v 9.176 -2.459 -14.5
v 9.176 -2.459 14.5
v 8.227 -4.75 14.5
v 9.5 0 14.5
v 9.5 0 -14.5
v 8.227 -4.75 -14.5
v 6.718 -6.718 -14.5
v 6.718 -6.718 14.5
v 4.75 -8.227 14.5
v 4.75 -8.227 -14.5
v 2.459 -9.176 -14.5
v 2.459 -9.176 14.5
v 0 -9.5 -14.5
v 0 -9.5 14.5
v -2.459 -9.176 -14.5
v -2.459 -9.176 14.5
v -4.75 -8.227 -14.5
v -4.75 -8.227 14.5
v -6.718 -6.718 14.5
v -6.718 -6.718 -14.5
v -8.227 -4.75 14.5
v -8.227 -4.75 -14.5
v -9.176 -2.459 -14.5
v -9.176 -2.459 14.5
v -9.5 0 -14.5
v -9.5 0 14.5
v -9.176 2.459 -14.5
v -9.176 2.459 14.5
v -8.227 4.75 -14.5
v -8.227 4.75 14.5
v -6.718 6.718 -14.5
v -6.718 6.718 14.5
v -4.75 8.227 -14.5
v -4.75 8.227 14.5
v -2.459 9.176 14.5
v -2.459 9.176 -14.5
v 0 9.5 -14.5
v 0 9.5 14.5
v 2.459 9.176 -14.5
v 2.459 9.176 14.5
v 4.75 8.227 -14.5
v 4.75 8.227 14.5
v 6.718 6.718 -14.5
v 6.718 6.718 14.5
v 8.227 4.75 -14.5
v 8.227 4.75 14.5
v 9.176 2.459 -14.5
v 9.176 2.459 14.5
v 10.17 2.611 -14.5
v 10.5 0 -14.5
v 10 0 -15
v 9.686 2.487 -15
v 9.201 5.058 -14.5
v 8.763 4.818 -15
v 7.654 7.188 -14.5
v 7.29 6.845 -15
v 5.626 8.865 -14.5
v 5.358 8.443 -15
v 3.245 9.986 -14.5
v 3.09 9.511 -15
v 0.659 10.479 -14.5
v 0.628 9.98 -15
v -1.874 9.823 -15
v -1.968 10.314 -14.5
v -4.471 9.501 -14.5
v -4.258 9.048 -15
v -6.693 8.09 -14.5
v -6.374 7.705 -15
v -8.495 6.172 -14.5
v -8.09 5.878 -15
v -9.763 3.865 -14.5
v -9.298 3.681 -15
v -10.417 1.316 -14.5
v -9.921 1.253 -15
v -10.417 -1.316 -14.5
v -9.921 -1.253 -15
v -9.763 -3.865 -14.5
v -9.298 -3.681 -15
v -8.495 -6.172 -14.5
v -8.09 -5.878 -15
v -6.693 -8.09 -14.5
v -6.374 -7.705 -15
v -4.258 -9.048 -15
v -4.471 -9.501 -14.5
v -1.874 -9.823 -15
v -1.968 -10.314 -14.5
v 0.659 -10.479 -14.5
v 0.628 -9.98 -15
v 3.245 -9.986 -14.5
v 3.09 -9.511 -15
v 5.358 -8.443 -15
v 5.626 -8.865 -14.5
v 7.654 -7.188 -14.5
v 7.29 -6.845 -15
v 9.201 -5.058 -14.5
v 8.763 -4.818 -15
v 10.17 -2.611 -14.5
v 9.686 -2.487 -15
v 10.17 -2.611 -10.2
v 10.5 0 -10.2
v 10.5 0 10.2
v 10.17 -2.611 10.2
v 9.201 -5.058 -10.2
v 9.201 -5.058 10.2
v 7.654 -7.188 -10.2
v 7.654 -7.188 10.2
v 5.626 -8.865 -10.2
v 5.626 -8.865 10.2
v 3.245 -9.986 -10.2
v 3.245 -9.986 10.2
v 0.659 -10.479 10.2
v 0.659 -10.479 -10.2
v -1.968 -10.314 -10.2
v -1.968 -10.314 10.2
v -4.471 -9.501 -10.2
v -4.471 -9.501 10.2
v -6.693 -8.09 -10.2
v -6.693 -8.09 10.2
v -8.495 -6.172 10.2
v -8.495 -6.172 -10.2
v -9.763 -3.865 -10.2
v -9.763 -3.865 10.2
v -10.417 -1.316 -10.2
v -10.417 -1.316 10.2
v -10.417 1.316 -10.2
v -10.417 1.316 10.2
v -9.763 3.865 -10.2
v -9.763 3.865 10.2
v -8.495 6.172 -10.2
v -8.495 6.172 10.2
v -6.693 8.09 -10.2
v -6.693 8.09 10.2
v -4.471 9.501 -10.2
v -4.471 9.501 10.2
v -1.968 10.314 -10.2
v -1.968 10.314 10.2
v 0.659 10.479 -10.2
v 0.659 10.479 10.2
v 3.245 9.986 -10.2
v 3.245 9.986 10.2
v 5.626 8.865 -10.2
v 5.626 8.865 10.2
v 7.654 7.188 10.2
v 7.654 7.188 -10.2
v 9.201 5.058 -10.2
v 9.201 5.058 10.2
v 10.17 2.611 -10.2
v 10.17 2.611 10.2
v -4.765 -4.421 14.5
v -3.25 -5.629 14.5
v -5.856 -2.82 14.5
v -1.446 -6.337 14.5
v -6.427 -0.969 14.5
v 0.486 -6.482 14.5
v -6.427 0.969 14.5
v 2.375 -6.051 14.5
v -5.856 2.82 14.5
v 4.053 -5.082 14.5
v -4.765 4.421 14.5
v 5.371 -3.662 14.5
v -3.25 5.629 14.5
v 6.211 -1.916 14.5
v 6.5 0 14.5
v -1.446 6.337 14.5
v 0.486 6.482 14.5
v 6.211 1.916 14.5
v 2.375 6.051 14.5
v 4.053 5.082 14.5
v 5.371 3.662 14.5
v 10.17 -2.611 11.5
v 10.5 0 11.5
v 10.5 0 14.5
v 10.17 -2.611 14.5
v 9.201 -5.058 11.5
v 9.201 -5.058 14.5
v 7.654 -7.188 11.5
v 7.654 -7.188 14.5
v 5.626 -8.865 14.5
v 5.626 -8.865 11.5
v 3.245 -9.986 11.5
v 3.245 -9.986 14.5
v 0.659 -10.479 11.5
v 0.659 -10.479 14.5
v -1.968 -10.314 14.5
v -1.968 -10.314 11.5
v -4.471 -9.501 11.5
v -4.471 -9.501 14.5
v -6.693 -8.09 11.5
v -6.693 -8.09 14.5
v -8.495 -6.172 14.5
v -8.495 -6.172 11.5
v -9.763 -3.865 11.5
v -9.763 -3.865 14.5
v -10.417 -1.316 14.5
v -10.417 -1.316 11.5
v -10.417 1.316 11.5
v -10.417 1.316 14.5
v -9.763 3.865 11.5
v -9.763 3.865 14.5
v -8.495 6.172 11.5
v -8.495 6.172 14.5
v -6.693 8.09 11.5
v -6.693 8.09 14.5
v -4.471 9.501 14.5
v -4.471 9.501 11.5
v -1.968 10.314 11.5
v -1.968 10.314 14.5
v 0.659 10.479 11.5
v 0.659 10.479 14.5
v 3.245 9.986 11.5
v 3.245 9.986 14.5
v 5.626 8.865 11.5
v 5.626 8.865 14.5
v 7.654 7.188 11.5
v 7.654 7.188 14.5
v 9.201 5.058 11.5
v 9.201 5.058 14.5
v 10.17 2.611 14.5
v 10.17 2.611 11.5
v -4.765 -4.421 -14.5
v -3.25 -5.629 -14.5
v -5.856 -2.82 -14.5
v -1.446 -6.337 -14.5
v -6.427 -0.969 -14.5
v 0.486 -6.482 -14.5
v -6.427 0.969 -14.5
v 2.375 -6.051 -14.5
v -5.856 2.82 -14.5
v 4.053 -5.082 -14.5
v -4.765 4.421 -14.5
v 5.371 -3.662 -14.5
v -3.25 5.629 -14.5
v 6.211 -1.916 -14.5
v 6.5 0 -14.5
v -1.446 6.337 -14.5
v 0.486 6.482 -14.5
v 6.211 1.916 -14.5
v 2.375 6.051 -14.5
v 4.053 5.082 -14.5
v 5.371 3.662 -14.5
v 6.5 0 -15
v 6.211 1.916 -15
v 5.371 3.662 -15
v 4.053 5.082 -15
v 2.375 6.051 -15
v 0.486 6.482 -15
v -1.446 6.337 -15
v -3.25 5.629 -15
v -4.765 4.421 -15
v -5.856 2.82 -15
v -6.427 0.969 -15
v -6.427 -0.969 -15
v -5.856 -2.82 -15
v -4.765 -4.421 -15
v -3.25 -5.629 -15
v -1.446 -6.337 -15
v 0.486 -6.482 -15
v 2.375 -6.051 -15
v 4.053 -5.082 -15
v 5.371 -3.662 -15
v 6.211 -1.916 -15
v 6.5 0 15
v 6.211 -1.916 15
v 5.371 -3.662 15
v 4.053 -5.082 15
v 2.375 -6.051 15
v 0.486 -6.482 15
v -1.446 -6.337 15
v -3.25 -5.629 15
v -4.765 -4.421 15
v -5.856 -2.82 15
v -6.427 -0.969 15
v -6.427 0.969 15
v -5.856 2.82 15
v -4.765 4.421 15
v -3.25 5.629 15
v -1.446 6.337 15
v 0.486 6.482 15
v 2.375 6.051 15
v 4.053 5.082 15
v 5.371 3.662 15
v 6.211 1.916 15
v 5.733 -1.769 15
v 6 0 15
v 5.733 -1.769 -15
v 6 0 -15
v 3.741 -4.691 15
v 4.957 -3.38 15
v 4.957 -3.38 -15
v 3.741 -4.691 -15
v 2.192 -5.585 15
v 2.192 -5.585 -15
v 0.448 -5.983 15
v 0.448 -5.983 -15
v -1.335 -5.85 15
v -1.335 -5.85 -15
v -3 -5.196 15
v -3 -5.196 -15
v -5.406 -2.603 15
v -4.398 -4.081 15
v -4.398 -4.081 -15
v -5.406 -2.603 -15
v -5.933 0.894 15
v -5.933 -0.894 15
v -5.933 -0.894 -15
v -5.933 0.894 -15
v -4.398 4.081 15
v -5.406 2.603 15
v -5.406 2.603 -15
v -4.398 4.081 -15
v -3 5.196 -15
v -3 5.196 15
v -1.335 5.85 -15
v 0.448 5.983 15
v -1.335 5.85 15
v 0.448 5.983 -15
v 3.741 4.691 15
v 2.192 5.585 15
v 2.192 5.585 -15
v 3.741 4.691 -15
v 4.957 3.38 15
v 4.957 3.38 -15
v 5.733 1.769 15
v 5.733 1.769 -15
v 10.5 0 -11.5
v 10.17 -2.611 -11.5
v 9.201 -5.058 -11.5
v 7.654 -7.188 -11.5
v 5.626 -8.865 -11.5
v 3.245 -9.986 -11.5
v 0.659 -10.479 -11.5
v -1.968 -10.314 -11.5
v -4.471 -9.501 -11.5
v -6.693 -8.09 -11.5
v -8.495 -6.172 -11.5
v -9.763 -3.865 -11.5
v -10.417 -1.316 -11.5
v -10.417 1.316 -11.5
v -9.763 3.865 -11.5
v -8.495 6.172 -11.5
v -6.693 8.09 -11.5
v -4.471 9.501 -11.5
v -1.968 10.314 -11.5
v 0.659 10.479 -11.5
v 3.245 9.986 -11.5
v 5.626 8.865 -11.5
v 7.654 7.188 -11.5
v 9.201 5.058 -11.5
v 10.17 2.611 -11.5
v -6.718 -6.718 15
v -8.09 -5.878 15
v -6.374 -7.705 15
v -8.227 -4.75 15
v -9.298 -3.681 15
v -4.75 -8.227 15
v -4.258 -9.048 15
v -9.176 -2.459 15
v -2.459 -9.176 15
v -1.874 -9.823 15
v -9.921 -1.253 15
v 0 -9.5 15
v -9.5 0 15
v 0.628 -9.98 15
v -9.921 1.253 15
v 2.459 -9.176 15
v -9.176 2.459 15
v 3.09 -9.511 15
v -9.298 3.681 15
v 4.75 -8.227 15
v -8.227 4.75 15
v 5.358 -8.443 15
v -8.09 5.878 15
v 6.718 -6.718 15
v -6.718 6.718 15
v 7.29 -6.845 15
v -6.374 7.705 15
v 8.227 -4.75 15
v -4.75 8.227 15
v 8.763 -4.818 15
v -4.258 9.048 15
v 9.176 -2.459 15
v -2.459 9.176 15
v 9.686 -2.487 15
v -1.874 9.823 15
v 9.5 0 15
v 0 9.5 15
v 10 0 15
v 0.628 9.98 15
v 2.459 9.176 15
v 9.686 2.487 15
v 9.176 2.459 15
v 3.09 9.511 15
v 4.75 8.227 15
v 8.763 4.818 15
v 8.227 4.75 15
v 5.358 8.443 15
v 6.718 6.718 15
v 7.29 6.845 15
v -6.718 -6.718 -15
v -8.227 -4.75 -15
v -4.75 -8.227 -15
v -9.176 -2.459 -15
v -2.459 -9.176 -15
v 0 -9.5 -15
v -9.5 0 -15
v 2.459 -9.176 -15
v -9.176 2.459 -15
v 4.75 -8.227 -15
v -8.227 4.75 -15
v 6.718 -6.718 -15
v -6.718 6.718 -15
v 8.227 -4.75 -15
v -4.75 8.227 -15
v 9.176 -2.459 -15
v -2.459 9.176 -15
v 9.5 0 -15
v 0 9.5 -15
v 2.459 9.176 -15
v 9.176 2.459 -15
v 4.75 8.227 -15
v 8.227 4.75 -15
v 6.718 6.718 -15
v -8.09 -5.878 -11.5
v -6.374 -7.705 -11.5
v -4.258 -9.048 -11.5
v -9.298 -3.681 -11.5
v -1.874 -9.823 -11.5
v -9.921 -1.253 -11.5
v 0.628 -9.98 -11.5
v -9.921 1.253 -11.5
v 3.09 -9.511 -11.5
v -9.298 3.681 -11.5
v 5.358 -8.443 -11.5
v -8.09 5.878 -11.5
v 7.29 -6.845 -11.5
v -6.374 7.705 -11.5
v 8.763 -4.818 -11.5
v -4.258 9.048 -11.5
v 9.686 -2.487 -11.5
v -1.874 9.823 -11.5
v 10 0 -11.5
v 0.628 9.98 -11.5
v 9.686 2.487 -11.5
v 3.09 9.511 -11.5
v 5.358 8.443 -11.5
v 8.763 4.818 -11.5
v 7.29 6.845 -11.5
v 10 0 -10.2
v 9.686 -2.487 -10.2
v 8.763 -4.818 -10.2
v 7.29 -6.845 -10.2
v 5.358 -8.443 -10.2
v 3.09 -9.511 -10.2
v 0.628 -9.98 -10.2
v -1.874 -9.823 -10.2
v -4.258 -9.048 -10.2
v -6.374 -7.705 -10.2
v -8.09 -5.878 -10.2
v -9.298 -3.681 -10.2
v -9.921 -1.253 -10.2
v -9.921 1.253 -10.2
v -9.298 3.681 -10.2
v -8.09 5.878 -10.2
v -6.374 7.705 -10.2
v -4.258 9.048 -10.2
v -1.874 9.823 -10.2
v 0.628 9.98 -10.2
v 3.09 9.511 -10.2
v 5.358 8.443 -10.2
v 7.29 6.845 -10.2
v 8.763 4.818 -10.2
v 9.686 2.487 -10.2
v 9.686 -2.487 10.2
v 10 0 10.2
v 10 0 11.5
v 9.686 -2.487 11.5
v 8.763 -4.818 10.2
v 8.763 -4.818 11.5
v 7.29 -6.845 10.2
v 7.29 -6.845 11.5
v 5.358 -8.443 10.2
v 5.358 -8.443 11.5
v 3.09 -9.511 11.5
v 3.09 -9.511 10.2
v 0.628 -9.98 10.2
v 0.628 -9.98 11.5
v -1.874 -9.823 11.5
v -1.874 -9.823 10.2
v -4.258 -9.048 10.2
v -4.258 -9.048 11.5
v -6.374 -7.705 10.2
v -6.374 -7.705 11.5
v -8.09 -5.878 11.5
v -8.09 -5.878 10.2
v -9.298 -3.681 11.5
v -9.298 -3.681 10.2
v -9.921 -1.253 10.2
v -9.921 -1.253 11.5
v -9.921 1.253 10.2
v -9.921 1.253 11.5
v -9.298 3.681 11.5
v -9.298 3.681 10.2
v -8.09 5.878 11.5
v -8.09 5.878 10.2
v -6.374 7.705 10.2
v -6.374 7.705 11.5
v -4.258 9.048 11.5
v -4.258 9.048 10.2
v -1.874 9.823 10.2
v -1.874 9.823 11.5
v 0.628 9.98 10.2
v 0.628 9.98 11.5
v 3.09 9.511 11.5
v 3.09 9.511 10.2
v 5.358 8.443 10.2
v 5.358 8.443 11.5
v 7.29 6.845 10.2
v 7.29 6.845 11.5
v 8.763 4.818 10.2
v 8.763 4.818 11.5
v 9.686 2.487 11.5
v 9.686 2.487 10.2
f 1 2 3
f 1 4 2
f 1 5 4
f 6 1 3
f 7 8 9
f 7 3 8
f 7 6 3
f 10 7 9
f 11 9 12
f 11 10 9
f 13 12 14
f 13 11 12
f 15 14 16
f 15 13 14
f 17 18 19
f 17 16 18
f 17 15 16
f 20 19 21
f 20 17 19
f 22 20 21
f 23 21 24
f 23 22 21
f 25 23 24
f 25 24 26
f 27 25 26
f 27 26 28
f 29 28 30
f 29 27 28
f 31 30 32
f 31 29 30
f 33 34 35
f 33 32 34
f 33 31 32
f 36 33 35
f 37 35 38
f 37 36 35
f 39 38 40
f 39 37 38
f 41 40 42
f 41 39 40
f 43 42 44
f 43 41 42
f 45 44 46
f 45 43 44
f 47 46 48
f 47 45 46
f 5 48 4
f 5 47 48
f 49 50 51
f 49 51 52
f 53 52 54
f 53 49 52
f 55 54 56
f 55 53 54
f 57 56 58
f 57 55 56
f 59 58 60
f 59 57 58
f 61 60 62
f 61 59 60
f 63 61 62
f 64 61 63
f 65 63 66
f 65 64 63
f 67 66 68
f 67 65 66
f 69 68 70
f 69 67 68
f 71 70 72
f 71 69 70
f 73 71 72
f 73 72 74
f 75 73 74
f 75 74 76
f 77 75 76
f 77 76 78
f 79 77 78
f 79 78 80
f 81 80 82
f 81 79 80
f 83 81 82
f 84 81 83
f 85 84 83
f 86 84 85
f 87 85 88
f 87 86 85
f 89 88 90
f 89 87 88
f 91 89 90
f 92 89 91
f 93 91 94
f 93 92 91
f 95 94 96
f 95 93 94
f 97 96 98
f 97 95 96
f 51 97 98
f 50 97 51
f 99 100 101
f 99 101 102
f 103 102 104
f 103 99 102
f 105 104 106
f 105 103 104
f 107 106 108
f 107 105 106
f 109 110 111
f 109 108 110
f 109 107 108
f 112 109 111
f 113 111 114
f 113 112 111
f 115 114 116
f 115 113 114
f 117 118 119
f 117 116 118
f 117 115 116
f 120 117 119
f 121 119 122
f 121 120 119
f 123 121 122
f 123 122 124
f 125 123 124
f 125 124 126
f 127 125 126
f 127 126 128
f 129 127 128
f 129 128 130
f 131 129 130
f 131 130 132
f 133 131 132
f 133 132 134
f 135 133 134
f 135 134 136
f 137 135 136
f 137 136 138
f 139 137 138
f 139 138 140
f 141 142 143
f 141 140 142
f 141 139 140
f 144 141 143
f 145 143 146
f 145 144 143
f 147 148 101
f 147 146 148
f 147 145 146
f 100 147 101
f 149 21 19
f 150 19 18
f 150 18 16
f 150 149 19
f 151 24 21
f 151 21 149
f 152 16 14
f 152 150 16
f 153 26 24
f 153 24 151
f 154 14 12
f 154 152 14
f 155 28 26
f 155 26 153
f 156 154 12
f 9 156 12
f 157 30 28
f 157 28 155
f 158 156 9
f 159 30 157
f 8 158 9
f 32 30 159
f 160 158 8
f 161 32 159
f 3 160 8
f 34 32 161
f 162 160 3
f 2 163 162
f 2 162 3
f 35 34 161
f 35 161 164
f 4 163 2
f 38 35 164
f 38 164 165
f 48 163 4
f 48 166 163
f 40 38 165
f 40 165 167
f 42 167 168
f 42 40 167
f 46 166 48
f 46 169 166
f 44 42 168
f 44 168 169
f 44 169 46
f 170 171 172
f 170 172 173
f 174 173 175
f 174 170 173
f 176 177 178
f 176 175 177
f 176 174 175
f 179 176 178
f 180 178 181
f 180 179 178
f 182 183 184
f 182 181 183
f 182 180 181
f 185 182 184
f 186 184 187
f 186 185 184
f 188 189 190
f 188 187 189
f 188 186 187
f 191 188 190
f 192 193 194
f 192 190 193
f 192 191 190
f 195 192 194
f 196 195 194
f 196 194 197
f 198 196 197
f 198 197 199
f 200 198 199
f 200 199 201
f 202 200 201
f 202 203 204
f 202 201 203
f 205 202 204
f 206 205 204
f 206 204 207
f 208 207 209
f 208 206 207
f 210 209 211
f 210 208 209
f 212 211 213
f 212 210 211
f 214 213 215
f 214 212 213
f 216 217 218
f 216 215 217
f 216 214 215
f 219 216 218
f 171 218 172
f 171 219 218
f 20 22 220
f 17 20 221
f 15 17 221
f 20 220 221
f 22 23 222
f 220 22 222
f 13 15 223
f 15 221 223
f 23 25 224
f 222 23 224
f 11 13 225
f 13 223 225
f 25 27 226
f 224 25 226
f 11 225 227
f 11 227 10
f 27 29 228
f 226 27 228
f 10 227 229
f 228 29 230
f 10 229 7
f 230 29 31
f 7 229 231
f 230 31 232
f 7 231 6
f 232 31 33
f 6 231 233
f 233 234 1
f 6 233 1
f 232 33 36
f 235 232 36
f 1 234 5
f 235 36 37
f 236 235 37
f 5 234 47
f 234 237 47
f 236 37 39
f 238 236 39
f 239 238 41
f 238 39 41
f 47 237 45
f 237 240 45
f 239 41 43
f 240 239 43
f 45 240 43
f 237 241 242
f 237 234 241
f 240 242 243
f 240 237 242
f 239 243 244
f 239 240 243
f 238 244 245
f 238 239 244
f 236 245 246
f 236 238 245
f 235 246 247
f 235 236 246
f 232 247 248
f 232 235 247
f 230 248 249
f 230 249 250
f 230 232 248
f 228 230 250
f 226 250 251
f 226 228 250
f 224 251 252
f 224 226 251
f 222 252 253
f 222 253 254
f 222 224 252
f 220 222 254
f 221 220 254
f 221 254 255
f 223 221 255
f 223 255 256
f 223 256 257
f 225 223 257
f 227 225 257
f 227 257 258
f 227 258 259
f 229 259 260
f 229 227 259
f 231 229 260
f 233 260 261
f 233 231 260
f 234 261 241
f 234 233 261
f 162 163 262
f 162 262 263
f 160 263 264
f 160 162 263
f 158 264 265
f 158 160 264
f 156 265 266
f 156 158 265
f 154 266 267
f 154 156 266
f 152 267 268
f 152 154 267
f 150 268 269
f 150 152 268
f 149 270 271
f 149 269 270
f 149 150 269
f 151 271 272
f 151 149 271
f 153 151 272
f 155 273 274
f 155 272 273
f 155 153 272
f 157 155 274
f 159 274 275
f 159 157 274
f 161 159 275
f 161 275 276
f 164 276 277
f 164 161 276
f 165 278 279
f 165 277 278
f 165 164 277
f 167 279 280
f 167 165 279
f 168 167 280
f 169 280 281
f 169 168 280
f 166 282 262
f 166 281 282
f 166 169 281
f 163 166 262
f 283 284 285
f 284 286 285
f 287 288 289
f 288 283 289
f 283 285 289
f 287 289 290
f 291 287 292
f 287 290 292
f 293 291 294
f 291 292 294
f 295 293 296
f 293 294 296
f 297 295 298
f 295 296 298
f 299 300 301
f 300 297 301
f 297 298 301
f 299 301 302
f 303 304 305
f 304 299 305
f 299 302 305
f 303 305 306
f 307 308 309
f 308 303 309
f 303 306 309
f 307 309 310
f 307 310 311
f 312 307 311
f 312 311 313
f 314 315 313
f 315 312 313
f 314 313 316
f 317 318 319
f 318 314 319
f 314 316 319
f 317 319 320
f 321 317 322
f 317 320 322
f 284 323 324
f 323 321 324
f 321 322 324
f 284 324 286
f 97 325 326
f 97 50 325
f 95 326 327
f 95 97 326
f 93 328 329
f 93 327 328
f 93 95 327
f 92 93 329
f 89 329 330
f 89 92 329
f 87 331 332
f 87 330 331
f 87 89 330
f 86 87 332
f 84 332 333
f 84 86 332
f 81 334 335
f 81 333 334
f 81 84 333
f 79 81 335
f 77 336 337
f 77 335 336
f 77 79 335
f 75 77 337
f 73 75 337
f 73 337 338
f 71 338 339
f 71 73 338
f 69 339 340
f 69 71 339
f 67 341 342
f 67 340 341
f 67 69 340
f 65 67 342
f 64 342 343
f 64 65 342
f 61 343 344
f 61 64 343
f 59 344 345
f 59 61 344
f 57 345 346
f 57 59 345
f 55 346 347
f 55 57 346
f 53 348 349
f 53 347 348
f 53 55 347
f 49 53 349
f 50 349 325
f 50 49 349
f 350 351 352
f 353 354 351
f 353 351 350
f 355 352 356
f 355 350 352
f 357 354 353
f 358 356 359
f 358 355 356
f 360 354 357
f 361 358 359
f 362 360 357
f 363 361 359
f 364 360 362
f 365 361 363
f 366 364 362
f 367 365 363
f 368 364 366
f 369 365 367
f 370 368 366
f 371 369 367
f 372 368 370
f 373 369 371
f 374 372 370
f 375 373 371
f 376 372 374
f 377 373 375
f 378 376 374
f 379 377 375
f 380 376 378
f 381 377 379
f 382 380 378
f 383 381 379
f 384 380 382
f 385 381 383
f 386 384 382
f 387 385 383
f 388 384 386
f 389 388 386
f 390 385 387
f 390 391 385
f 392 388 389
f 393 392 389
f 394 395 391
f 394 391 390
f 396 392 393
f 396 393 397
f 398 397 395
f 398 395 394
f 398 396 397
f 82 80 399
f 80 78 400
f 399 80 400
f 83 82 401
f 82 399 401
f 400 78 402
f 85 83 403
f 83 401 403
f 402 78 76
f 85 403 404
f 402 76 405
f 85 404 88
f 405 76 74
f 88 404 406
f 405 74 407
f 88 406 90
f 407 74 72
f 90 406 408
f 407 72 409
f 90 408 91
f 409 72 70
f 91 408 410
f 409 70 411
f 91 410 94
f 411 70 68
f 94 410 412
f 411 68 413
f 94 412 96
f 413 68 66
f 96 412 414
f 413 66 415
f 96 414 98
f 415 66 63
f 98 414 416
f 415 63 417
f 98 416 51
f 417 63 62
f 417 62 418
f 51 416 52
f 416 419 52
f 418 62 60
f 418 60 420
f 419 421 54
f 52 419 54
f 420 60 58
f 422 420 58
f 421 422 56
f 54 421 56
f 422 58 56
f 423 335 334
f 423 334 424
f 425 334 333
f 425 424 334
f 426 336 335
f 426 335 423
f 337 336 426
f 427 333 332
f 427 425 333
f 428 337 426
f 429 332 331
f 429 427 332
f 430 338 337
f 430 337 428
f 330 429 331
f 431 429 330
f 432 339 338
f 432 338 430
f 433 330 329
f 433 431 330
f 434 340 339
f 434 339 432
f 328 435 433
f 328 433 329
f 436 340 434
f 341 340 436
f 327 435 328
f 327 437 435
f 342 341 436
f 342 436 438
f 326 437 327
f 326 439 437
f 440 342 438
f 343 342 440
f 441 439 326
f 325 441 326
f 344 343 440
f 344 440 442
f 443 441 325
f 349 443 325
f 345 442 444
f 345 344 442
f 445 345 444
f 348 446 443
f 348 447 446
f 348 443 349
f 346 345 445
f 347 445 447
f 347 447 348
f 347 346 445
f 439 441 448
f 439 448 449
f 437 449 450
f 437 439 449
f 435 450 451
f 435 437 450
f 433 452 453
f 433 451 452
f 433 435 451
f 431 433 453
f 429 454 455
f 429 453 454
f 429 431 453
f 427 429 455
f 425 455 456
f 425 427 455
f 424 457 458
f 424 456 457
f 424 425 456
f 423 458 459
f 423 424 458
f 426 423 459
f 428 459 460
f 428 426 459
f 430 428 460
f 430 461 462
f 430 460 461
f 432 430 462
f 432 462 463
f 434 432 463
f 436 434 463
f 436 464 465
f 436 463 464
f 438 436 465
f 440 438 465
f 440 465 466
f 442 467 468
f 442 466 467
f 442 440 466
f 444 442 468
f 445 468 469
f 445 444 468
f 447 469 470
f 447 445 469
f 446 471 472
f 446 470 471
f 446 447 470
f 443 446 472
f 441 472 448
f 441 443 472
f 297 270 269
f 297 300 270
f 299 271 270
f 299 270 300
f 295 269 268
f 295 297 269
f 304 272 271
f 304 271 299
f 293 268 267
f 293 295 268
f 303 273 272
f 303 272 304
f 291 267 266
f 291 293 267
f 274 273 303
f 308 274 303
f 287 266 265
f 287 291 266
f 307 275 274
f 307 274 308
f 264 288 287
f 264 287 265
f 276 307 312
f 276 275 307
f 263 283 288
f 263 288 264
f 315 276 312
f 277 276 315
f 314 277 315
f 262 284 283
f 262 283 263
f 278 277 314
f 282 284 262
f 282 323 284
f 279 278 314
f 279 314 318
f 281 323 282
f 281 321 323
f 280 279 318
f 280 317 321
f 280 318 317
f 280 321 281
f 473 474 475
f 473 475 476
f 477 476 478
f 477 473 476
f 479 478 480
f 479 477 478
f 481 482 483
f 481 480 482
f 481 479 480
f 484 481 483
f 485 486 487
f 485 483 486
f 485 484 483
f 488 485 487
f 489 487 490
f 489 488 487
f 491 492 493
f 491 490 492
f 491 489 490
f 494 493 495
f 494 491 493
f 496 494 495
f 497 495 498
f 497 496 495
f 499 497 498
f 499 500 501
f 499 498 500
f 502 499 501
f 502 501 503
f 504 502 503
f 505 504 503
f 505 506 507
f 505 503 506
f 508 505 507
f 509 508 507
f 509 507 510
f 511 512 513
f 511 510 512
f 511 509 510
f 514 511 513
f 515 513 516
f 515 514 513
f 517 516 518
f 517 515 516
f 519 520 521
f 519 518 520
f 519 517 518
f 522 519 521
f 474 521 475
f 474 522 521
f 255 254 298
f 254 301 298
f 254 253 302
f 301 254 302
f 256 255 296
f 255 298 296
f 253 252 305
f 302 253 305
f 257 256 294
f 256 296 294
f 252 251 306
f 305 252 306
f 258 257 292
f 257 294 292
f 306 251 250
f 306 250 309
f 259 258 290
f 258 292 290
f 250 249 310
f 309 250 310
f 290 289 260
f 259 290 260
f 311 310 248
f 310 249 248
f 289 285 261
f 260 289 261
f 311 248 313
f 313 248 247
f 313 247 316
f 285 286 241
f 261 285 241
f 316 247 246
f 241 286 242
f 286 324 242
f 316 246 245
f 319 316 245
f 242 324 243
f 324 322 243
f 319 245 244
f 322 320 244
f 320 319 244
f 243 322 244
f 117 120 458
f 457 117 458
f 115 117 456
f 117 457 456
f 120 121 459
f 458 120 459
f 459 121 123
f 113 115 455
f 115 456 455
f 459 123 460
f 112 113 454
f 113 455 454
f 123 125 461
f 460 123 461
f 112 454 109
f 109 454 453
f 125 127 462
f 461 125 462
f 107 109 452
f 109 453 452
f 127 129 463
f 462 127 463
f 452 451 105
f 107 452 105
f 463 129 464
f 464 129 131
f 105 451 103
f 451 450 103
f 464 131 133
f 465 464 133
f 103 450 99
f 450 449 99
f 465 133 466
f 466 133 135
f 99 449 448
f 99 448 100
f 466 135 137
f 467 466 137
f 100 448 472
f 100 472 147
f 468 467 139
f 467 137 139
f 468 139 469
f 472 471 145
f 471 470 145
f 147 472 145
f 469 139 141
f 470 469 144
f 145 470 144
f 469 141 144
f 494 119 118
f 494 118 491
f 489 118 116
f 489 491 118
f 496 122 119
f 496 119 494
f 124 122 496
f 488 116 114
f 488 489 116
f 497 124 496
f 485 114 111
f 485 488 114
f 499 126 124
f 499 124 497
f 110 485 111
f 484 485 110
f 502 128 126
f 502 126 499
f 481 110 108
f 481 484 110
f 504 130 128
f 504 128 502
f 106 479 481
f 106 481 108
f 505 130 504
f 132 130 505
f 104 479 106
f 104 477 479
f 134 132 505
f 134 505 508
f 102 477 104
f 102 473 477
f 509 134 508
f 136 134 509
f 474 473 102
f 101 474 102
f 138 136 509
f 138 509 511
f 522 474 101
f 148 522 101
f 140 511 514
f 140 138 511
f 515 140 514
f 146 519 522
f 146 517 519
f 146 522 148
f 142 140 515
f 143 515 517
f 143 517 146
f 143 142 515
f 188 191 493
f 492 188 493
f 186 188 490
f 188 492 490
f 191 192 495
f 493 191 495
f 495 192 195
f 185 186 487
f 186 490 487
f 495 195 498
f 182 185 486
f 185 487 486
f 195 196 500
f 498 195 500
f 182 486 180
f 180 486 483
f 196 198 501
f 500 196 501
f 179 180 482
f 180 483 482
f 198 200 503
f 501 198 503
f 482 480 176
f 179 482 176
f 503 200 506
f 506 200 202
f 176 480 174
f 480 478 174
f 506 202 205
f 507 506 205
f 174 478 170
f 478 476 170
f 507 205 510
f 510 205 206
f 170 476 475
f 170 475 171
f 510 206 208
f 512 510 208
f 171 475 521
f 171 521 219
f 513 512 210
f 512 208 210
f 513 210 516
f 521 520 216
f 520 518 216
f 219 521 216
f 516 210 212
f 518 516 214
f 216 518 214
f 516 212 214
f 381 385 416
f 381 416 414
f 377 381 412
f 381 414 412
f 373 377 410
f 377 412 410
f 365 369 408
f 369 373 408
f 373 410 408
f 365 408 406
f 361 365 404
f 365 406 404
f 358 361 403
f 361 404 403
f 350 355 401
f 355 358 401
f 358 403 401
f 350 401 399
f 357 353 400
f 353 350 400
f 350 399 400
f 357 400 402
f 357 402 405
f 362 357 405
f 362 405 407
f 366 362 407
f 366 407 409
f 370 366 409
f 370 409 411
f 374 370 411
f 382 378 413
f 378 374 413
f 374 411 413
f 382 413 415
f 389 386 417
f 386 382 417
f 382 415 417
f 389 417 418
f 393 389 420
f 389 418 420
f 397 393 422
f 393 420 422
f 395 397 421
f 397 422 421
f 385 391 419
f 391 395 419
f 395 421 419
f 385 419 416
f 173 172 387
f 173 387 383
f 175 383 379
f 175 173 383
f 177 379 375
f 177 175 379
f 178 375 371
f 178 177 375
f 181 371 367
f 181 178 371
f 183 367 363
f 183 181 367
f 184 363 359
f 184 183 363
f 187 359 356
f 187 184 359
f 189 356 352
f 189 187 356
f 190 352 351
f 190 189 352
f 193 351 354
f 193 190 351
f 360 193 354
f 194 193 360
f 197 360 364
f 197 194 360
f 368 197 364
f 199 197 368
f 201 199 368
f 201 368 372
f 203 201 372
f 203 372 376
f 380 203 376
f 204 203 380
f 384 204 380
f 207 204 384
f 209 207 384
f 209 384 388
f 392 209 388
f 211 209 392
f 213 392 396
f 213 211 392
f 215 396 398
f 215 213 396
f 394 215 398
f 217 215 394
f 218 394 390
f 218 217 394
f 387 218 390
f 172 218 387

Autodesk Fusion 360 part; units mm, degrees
sketch "スケッチ1" plane through (0, 0, 0) normal (0, 1, 0) x (1, 0, 0)
  line L0 (0, 0) -> (0, -15)
  line L1 (0, -15) -> (10.5, -15)
  line L2 (10.5, -15) -> (10.5, -11.5)
  line L3 (10.5, -11.5) -> (10, -11.5)
  line L4 (10, -11.5) -> (10, -10.2)
  line L5 (10, -10.2) -> (10.5, -10.2)
  line L6 (10.5, -10.2) -> (10.5, 10.2)
  line L7 (10.5, 10.2) -> (10, 10.2)
  line L8 (10, 10.2) -> (10, 11.5)
  line L9 (10, 11.5) -> (10.5, 11.5)
  line L10 (10.5, 11.5) -> (10.5, 15)
  line L11 (10.5, 15) -> (0, 15)
  line L12 (0, 15) -> (0, 0)
  line L13 (9.5, -15) -> (9.5, 15)
  line L14 (6.5, -15) -> (6.5, -14.5)
  line L15 (6.5, -14.5) -> (9.5, -14.5)
  line L16 (6, -15) -> (6, 15)
  line L17 (6.5, 15) -> (6.5, 14.5)
  line L18 (6.5, 14.5) -> (9.5, 14.5)
  dimension "d1" = 10.5
  dimension "d2" = 15
  dimension "d3" = 15
  dimension "d4" = 10
  dimension "d5" = 3.5
  dimension "d6" = 1.3
  dimension "d7" = 3.5
  dimension "d8" = 1.3
  dimension "d9" = 9.5
  dimension "d10" = 6
  dimension "d11" = 0.5
  dimension "d12" = 0.5
  dimension "d13" = 0.5
revolve "回転1" add sketch "スケッチ1" angle 360 about axis through (0, 0, 0) along (0, 0, 1) contours L1 L11 L13 L14 L15 L16 L17 L18 makes body 1
revolve "回転2" add sketch "スケッチ1" angle 360 about axis through (0, 0, 1.75) along (0, 0, 1) separate body contours L1 L2 L3 L4 L5 L6 L7 L8 L9 L10 L11 L13 makes body 2
chamfer "面取り1" distance 0.5 angle 45 2 edges at (-9.7894, -3.797, 15) (-9.7894, -3.797, -15) on bodies 2
equation "d3 = d2"
equation "d7 = d5"
equation "d8 = d6"
equation "d13 = d12"
